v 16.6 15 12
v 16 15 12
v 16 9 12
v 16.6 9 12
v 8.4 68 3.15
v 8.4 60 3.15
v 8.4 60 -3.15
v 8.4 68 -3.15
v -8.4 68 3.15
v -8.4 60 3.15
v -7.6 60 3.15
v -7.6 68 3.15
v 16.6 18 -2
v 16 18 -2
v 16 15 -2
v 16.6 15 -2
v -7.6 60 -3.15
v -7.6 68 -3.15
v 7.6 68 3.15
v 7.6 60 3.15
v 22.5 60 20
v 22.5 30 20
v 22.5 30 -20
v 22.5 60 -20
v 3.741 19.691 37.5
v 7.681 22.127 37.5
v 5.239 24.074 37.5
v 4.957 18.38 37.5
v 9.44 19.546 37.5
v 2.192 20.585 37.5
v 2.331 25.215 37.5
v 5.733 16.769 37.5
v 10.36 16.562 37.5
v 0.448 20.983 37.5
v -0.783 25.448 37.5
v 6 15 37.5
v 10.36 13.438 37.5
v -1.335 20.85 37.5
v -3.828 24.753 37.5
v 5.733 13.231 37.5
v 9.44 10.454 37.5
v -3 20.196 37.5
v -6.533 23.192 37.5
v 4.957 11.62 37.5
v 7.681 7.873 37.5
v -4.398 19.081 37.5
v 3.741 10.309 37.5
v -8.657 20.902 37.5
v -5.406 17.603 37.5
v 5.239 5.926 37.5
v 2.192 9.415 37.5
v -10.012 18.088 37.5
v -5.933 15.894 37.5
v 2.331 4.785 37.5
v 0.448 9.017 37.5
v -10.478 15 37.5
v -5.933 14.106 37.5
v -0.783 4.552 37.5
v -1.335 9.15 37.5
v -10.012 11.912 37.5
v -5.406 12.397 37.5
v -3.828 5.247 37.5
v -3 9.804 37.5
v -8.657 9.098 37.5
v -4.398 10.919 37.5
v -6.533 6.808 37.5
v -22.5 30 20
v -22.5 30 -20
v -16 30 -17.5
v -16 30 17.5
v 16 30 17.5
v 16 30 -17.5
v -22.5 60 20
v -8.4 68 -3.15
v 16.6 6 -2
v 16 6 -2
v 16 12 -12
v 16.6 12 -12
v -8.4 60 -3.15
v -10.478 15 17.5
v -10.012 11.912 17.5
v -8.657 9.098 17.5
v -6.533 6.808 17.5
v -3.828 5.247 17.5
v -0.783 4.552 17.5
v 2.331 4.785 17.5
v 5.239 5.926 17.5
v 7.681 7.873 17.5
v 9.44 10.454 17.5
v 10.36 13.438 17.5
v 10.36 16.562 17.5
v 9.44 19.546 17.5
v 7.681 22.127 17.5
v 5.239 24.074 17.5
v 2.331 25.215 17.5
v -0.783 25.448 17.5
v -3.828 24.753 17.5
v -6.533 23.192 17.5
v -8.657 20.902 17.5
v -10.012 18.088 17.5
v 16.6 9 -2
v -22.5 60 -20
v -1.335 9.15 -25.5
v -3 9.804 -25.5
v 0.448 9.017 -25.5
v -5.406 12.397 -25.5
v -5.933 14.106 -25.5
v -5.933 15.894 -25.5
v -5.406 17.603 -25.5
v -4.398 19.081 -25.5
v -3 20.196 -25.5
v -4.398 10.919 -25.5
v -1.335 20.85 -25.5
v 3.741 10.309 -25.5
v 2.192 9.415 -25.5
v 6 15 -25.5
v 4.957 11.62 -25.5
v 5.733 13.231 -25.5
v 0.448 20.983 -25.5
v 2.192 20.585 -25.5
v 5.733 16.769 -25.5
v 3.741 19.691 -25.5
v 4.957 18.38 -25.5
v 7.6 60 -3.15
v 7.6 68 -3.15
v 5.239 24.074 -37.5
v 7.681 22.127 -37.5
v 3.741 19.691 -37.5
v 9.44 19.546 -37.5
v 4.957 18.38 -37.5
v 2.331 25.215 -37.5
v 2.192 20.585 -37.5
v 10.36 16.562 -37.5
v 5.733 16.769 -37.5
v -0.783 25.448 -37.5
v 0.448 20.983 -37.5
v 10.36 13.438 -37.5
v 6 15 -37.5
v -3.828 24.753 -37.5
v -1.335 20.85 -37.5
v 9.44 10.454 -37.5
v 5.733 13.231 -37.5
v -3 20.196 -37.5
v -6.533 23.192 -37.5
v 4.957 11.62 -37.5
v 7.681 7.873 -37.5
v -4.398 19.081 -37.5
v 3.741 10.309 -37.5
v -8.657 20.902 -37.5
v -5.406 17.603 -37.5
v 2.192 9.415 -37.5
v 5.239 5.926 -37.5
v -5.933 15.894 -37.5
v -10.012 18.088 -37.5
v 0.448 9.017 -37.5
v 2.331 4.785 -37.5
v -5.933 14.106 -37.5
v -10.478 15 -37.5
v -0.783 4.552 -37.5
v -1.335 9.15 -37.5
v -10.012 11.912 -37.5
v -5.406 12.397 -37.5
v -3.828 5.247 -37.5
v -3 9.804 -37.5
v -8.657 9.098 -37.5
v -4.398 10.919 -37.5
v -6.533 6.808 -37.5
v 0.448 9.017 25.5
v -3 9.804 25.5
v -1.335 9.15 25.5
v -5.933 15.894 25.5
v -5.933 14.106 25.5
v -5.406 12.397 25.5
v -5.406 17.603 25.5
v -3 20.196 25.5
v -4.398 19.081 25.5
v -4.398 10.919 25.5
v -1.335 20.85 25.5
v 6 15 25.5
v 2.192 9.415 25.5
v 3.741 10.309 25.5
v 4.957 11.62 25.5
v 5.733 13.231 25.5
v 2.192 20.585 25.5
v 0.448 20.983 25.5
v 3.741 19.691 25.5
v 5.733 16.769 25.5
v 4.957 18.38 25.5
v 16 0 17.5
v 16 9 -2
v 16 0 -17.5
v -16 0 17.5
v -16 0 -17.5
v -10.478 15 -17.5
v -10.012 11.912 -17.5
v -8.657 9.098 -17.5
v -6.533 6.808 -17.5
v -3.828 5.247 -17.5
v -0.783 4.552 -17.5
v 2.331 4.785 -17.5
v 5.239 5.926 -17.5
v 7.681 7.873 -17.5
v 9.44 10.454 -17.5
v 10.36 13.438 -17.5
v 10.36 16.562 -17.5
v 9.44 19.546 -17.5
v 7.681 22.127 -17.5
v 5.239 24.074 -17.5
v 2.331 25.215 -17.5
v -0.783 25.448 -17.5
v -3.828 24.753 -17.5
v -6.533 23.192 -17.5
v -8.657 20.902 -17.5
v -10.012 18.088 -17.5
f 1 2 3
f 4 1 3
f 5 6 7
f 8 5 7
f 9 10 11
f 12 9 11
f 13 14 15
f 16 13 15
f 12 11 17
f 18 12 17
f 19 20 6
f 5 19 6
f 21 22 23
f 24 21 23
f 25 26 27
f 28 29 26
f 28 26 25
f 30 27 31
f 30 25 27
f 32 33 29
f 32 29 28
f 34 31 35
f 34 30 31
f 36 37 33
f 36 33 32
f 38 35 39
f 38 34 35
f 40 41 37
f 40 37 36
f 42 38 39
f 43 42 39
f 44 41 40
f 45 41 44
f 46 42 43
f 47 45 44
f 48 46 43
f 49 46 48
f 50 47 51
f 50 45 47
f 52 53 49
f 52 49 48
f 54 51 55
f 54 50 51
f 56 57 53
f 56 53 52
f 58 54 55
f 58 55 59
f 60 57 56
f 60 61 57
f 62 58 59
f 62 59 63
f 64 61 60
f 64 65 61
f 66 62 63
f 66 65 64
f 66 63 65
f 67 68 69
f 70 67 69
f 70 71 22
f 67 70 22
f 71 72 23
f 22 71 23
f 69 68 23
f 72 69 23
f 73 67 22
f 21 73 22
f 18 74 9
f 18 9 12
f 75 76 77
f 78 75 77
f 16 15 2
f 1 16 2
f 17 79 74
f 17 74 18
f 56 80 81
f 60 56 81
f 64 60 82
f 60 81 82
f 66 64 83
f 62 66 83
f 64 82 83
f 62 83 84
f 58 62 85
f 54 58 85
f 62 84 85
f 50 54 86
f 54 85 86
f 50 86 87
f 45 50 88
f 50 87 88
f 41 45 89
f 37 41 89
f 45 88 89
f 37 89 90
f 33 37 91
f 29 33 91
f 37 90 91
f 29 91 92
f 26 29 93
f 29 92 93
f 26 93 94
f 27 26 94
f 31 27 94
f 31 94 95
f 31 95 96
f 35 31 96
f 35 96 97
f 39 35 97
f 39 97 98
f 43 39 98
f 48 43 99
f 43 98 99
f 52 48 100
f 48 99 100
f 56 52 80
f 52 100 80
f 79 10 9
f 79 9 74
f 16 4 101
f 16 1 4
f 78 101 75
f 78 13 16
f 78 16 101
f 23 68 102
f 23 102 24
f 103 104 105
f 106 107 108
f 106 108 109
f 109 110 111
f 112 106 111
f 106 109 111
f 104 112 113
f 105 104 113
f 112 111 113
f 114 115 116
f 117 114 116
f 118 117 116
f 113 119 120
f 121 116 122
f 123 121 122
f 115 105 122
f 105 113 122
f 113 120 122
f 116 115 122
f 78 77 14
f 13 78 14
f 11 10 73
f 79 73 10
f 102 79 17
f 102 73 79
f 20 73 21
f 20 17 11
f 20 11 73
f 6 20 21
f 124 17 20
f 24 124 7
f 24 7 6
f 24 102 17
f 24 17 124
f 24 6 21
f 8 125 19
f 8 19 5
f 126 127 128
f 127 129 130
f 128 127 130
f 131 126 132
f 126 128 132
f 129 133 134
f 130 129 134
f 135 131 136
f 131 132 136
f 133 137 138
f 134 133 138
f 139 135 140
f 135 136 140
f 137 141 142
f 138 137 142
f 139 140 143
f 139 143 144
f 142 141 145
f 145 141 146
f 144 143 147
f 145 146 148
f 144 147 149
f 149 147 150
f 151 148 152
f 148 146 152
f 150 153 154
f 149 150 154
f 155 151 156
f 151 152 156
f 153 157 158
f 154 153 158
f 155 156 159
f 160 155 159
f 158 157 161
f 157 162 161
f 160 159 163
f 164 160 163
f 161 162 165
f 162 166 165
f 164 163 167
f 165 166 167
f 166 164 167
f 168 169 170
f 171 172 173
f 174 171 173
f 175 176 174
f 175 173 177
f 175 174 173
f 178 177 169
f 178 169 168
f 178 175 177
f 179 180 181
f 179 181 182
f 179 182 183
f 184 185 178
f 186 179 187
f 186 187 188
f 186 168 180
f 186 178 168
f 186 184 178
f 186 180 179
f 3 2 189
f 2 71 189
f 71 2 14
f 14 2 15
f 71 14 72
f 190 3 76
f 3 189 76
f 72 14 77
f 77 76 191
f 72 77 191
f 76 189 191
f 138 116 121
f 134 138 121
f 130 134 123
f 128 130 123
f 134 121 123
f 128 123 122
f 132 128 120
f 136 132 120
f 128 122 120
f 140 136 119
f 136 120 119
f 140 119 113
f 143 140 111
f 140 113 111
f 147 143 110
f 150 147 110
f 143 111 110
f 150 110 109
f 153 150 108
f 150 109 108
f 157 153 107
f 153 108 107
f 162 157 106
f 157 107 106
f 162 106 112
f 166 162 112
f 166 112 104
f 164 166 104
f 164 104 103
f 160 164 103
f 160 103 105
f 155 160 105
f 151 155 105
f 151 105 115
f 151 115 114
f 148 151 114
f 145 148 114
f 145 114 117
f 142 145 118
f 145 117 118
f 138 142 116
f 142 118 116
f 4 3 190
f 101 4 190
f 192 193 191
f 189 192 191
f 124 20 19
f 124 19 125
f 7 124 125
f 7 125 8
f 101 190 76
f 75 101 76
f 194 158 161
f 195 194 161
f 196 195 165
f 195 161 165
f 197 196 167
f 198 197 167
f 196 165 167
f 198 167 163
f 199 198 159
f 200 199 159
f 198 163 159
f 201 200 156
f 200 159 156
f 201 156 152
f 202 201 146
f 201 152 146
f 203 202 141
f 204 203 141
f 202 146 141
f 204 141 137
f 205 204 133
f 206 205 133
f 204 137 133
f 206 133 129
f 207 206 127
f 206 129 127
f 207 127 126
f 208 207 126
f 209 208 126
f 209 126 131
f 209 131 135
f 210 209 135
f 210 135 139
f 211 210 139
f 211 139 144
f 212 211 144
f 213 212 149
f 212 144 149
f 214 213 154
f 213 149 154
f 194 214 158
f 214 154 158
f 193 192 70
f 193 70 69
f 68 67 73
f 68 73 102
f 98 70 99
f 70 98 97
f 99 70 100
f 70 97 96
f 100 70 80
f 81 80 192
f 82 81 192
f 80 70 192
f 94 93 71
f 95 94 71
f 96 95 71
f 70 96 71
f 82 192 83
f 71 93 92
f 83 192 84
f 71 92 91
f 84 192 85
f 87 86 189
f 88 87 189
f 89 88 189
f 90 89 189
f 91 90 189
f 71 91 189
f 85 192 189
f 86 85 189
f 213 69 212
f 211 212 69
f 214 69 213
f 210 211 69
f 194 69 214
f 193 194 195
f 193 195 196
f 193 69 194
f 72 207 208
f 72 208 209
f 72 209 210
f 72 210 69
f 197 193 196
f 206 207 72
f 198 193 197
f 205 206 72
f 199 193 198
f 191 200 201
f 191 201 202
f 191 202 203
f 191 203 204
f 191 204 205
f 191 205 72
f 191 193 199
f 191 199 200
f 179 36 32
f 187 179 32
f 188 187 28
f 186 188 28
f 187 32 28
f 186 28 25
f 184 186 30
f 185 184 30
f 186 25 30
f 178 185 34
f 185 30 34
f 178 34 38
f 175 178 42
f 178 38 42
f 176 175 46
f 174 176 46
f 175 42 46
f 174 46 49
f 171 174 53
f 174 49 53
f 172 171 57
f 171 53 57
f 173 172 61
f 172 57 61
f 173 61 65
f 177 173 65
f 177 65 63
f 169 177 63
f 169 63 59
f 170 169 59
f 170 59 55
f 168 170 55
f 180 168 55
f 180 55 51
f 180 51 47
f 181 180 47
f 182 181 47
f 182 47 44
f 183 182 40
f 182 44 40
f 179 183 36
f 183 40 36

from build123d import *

# Parameters (mm, degrees)
SKETCH1_W             = 32
SKETCH1_H             = 35
BRASS_BODY_DEPTH      = 30
COIL_START            = 30
SKETCH2_W             = 45
SKETCH2_H             = 40
COIL_DEPTH            = 30
INLET_STUB_START      = 17.5
SKETCH3_R             = 10.4775
INLET_STUB_DEPTH      = 20
OUTLET_STUB_START     = -37.5
SKETCH4_R             = 10.4775
OUTLET_STUB_DEPTH     = 20
INLET_BORE_START      = 37.5
SKETCH5_R             = 6
INLET_BORE_DEPTH      = 12
OUTLET_BORE_START     = -25.5
SKETCH6_R             = 6
OUTLET_BORE_DEPTH     = 12
SPADE_TERMINALS_START = 60
SKETCH7_W             = 0.8
SKETCH7_H             = 6.3
SPADE_TERMINALS_DEPTH = 8
FLOW_ARROW_START      = 16
FLOW_ARROW_DEPTH      = 0.6


with BuildPart() as part:
    # Sketch1 → Brass_Body (new body)
    with BuildSketch(Plane(origin=(0, 0, 0), x_dir=(1, 0, 0), z_dir=(0, 1, 0))):
        Rectangle(SKETCH1_W, SKETCH1_H)
    extrude(amount=BRASS_BODY_DEPTH)

    # Sketch2 → Coil (add)
    with BuildSketch(Plane(origin=(0, 0, 0), x_dir=(1, 0, 0), z_dir=(0, 1, 0)).offset(COIL_START)):
        Rectangle(SKETCH2_W, SKETCH2_H)
    extrude(amount=COIL_DEPTH)

    # Sketch3 → Inlet_Stub (add)
    with BuildSketch(Plane.XY.offset(INLET_STUB_START)):
        with Locations(Location((0, 15, 0), (0, 0, 180))):
            Circle(SKETCH3_R)
    extrude(amount=INLET_STUB_DEPTH)

    # Sketch4 → Outlet_Stub (add)
    with BuildSketch(Plane.XY.offset(OUTLET_STUB_START)):
        with Locations(Location((0, 15, 0), (0, 0, 180))):
            Circle(SKETCH4_R)
    extrude(amount=OUTLET_STUB_DEPTH)

    # Sketch5 → Inlet_Bore (cut)
    with BuildSketch(Plane.XY.offset(INLET_BORE_START)):
        with Locations((0, 15)):
            Circle(SKETCH5_R)
    extrude(amount=-INLET_BORE_DEPTH, mode=Mode.SUBTRACT)

    # Sketch6 → Outlet_Bore (cut)
    with BuildSketch(Plane.XY.offset(OUTLET_BORE_START)):
        with Locations((0, 15)):
            Circle(SKETCH6_R)
    extrude(amount=-OUTLET_BORE_DEPTH, mode=Mode.SUBTRACT)

    # Sketch7 → Spade_Terminals (add)
    with BuildSketch(Plane(origin=(0, 0, 0), x_dir=(1, 0, 0), z_dir=(0, 1, 0)).offset(SPADE_TERMINALS_START)):
        with Locations((-8, 0)):
            Rectangle(SKETCH7_W, SKETCH7_H)
        with Locations((8, 0)):
            Rectangle(SKETCH7_W, SKETCH7_H)
    extrude(amount=SPADE_TERMINALS_DEPTH)

    # Sketch8 → Flow_Arrow (add)
    with BuildSketch(Plane(origin=(0, 0, 0), x_dir=(0, 0, -1), z_dir=(1, 0, 0)).offset(FLOW_ARROW_START)):
        Polygon((-12, 9), (2, 9), (2, 6), (12, 12), (2, 18), (2, 15), (-12, 15), align=None)
    extrude(amount=FLOW_ARROW_DEPTH)


solid = part.part
